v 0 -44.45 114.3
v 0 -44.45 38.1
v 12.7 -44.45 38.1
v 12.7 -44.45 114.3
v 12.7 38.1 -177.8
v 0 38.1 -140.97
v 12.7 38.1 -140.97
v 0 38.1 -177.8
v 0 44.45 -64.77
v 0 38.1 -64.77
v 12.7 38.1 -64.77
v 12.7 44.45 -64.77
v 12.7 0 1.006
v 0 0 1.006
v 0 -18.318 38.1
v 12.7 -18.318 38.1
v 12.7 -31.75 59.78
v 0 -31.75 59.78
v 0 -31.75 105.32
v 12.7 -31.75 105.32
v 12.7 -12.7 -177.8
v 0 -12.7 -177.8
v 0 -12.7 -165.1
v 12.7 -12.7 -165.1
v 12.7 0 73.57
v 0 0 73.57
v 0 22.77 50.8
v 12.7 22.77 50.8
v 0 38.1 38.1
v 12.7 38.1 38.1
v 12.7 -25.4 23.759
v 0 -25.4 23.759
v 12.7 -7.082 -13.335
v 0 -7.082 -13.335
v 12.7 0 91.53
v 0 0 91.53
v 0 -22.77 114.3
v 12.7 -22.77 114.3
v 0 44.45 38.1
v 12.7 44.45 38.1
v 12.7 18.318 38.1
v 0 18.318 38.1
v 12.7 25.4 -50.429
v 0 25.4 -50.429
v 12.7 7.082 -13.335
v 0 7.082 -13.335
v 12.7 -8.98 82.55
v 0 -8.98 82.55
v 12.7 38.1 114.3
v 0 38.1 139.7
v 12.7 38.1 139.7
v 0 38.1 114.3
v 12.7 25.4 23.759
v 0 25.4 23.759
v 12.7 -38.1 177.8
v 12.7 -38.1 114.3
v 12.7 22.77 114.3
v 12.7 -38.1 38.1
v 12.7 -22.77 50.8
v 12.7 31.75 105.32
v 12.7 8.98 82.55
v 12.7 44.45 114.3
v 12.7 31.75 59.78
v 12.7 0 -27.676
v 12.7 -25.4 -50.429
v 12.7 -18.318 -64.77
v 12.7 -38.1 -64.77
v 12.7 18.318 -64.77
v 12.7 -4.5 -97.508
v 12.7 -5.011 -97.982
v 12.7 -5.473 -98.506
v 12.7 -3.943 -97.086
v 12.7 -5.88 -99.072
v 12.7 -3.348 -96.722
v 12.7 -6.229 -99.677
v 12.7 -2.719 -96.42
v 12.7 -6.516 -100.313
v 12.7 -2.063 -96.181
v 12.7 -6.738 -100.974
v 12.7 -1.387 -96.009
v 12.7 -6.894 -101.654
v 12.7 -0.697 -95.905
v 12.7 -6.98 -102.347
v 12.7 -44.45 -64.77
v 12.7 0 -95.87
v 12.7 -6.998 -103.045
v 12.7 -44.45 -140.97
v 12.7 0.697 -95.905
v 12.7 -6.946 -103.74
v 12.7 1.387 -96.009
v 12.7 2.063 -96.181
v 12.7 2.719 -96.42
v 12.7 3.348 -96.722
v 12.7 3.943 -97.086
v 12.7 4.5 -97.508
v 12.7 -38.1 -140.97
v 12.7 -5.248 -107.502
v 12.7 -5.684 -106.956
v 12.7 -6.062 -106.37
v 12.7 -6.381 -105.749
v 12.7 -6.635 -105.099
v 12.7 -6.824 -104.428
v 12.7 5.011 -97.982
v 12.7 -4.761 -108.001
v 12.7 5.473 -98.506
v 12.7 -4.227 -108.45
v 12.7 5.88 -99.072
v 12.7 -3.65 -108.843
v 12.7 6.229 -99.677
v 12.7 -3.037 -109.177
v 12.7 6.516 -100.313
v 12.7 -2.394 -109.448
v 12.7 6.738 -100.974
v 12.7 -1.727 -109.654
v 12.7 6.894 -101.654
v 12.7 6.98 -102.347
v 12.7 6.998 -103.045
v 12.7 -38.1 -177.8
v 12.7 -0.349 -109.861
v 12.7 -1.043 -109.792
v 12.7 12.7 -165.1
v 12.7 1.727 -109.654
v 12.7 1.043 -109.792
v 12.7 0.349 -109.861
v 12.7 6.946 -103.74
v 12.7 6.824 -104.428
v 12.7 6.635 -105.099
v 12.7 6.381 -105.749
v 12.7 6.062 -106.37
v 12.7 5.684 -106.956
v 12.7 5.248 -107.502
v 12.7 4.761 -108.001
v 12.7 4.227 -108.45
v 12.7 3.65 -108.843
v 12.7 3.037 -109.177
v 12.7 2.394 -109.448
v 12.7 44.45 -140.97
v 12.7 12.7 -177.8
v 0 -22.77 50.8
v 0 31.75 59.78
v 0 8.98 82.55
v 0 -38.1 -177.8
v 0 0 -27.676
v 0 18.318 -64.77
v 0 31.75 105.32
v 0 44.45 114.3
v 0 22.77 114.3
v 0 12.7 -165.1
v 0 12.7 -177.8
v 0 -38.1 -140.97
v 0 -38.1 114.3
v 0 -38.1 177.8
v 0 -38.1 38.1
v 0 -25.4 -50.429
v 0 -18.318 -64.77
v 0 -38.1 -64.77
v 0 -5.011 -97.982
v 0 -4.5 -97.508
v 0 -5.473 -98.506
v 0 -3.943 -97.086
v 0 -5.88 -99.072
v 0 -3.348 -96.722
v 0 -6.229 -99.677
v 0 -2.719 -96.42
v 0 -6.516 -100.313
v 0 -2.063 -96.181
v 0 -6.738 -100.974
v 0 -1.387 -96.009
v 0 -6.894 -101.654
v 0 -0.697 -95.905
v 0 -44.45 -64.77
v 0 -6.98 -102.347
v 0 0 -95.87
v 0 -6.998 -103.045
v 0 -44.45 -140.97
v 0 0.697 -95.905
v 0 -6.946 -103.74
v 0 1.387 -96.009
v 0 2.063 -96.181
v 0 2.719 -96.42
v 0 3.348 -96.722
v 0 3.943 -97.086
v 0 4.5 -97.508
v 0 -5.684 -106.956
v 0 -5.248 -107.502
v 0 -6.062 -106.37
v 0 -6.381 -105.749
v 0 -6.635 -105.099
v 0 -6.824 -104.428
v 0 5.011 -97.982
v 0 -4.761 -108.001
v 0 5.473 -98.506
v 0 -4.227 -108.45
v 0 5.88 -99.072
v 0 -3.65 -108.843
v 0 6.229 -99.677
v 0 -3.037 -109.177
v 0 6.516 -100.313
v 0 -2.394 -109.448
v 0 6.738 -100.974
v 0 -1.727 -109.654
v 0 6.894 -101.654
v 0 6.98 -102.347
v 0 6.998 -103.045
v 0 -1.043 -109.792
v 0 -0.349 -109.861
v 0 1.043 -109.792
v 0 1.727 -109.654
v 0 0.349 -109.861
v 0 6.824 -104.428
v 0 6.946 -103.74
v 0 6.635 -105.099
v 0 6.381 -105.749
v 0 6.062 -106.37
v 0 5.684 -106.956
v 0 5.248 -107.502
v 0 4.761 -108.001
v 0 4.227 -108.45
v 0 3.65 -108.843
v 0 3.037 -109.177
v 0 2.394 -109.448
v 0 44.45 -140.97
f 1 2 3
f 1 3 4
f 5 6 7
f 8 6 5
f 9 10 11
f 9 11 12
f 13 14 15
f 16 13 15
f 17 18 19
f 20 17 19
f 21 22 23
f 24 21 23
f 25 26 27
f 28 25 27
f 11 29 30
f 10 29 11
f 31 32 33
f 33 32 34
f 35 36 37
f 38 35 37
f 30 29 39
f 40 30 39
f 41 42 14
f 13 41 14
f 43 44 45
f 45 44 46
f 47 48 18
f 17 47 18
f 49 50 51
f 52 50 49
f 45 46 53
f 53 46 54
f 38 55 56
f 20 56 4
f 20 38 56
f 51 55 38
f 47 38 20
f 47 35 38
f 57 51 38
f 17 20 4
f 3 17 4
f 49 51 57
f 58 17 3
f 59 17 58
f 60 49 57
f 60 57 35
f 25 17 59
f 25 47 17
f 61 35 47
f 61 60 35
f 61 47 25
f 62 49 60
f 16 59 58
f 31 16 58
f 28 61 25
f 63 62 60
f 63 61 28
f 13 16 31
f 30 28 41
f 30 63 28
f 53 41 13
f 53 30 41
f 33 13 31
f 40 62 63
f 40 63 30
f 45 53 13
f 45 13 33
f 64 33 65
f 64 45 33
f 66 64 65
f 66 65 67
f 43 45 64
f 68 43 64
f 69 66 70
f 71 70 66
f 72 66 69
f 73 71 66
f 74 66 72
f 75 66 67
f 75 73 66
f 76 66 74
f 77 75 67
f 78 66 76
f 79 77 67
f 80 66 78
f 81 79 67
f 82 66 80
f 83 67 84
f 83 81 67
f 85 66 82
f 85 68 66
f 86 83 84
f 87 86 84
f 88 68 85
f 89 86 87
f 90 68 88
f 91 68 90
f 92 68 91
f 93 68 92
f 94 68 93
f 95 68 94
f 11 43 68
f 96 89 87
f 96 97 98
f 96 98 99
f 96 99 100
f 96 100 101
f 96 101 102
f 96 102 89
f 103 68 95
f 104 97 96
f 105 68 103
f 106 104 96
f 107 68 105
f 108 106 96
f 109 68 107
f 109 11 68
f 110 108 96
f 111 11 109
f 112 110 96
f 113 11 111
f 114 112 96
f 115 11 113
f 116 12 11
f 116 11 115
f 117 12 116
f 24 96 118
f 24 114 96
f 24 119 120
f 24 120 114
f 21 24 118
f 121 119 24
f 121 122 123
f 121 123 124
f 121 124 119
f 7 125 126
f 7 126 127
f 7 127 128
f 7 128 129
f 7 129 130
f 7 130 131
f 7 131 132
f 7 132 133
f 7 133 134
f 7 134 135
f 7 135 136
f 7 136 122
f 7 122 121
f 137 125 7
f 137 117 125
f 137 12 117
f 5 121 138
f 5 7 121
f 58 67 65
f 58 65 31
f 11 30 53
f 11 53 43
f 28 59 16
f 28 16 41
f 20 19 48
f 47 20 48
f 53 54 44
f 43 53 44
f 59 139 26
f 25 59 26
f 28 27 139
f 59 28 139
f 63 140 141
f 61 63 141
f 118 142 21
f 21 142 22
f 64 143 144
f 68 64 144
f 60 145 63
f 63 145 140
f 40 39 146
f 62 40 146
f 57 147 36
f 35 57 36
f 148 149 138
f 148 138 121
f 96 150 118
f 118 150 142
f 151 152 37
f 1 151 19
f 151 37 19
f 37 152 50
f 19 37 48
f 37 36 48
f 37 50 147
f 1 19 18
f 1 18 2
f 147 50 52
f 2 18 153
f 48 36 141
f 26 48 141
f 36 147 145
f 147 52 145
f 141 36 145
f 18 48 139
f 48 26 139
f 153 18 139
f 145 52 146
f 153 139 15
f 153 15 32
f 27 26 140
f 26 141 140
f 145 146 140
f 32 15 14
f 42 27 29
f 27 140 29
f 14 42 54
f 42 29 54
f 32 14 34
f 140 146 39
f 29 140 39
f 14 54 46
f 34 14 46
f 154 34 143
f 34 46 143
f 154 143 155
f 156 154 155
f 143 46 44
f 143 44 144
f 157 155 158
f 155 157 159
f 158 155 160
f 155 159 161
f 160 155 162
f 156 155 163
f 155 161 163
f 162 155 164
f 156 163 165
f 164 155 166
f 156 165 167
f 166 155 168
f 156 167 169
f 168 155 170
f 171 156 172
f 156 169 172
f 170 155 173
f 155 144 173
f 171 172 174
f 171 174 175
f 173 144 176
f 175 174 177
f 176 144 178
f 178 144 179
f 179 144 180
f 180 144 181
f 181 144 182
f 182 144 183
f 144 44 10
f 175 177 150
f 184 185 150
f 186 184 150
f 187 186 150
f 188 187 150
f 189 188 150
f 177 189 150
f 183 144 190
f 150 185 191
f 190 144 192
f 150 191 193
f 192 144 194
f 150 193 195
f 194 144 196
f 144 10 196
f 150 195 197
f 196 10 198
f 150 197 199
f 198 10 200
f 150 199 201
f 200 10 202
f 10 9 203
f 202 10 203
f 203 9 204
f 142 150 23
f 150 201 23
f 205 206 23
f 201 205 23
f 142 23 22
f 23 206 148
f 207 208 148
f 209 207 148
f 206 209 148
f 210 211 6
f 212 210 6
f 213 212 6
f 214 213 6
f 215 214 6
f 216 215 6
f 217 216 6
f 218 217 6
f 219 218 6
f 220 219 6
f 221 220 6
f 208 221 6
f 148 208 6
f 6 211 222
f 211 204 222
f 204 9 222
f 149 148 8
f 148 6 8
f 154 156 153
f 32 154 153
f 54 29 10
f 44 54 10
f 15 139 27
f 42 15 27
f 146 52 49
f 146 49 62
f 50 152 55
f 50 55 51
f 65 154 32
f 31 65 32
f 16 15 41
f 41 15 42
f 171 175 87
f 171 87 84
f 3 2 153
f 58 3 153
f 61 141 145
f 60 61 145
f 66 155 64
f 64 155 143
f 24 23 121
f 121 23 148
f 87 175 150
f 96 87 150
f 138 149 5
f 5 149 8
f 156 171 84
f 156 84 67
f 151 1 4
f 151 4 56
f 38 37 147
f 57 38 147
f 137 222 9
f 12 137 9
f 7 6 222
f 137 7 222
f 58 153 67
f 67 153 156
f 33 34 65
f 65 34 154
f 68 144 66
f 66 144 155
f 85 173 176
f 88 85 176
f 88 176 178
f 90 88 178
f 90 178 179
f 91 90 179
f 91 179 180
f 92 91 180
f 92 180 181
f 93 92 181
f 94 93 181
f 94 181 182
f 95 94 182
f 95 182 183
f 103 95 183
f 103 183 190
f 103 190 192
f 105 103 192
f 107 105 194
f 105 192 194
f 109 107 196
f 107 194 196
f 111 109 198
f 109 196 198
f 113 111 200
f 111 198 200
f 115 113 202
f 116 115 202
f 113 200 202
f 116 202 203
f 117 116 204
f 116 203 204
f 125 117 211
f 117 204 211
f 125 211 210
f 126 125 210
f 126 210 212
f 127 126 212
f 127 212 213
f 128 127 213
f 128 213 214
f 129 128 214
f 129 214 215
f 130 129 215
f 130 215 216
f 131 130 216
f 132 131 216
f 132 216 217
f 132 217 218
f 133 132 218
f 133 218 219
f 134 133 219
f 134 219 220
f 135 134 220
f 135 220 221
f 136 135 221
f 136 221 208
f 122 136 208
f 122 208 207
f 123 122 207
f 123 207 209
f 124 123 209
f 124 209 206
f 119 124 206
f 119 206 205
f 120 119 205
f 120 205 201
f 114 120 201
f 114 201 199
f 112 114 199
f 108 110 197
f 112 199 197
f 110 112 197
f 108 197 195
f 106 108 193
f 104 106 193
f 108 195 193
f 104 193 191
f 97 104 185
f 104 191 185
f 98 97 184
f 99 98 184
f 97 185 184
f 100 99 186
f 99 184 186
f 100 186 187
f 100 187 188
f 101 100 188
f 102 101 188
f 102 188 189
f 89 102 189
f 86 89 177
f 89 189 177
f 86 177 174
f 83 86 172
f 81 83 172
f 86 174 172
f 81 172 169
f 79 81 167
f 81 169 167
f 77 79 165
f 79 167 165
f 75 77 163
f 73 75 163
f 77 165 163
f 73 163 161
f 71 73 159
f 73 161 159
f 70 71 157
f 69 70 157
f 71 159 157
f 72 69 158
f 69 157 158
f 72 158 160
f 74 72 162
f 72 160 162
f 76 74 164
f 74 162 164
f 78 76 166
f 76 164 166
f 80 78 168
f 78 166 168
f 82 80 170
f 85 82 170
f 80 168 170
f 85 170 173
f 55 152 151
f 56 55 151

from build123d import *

# Parameters (mm, degrees)
SKETCH1_W               = 355.6
SKETCH1_H               = 76.2
BOSS_EXTRUDE1_DEPTH     = 12.7
CUT_EXTRUDE1_DEPTH      = 183.279291199
CUT_EXTRUDE1_DEPTH_BACK = 183.279291199
SKETCH3_W               = 76.2
SKETCH3_H               = 6.35
BOSS_EXTRUDE2_DEPTH     = 12.7
SKETCH4_W               = 12.7
SKETCH4_H               = 25.4
CUT_EXTRUDE2_DEPTH      = 184.711546997
SKETCH5_R               = 7
CUT_EXTRUDE3_DEPTH      = 184.711546997
CUT_EXTRUDE4_DEPTH      = 184.711546997


with BuildPart() as part:
    # Sketch1 → Boss-Extrude1 (new body)
    with BuildSketch(Plane(origin=(0, 0, 0), x_dir=(0, 0, -1), z_dir=(1, 0, 0))):
        Rectangle(SKETCH1_W, SKETCH1_H)
    extrude(amount=BOSS_EXTRUDE1_DEPTH)

    # Sketch2 → Cut-Extrude1 (cut, two sides: drawn at the far end of the back side and taken through both)
    with BuildSketch(Plane(origin=(12.7, 0, 0), x_dir=(0, 0, -1), z_dir=(1, 0, 0)).offset(-CUT_EXTRUDE1_DEPTH_BACK)):
        Polygon((-507.550847217, -697.601694433), (-177.8, -38.1), (-139.7, 38.1), (190.050847217, 697.601694433), (-1128.95254165, 1357.103388866), (-1826.554236083, -38.1), align=None)
    extrude(amount=CUT_EXTRUDE1_DEPTH + CUT_EXTRUDE1_DEPTH_BACK, mode=Mode.SUBTRACT)

    # Sketch3 → Boss-Extrude2 (add)
    with BuildSketch(Plane.ZY):
        with Locations((-102.87, -41.275)):
            Rectangle(SKETCH3_W, SKETCH3_H)
        with Locations((76.2, -41.275)):
            Rectangle(SKETCH3_W, SKETCH3_H)
        with Locations((-102.87, 41.275)):
            Rectangle(SKETCH3_W, SKETCH3_H)
        with Locations((76.2, 41.275)):
            Rectangle(SKETCH3_W, SKETCH3_H)
    extrude(amount=-BOSS_EXTRUDE2_DEPTH)

    # Sketch4 → Cut-Extrude2 (cut, through all)
    with BuildSketch(Plane.ZY):
        with Locations((-171.45, 0)):
            Rectangle(SKETCH4_W, SKETCH4_H)
    extrude(amount=-CUT_EXTRUDE2_DEPTH, mode=Mode.SUBTRACT)

    # Sketch5 → Cut-Extrude3 (cut, through all)
    with BuildSketch(Plane.ZY):
        with Locations((-102.87, 0)):
            Circle(SKETCH5_R)
    extrude(amount=-CUT_EXTRUDE3_DEPTH, mode=Mode.SUBTRACT)

    # Sketch6 → Cut-Extrude4 (cut, through all)
    with BuildSketch(Plane.ZY):
        Polygon((-13.335, -7.08207294), (-50.428802297, -25.4), (23.758802297, -25.4), align=None)
        Polygon((-27.676197703, 0), (-64.77, 18.31792706), (-64.77, -18.31792706), align=None)
        Polygon((23.758802297, 25.4), (-50.428802297, 25.4), (-13.335, 7.08207294), align=None)
        Polygon((38.1, -18.31792706), (38.1, 18.31792706), (1.006197703, 0), align=None)
        Polygon((105.319743879, -31.75), (82.55, -8.980256121), (59.780256121, -31.75), align=None)
        Polygon((114.3, 22.769743879), (91.530256121, 0), (114.3, -22.769743879), align=None)
        Polygon((73.569743879, 0), (50.8, 22.769743879), (50.8, -22.769743879), align=None)
        Polygon((105.319743879, 31.75), (59.780256121, 31.75), (82.55, 8.980256121), align=None)
    extrude(amount=-CUT_EXTRUDE4_DEPTH, mode=Mode.SUBTRACT)


solid = part.part
